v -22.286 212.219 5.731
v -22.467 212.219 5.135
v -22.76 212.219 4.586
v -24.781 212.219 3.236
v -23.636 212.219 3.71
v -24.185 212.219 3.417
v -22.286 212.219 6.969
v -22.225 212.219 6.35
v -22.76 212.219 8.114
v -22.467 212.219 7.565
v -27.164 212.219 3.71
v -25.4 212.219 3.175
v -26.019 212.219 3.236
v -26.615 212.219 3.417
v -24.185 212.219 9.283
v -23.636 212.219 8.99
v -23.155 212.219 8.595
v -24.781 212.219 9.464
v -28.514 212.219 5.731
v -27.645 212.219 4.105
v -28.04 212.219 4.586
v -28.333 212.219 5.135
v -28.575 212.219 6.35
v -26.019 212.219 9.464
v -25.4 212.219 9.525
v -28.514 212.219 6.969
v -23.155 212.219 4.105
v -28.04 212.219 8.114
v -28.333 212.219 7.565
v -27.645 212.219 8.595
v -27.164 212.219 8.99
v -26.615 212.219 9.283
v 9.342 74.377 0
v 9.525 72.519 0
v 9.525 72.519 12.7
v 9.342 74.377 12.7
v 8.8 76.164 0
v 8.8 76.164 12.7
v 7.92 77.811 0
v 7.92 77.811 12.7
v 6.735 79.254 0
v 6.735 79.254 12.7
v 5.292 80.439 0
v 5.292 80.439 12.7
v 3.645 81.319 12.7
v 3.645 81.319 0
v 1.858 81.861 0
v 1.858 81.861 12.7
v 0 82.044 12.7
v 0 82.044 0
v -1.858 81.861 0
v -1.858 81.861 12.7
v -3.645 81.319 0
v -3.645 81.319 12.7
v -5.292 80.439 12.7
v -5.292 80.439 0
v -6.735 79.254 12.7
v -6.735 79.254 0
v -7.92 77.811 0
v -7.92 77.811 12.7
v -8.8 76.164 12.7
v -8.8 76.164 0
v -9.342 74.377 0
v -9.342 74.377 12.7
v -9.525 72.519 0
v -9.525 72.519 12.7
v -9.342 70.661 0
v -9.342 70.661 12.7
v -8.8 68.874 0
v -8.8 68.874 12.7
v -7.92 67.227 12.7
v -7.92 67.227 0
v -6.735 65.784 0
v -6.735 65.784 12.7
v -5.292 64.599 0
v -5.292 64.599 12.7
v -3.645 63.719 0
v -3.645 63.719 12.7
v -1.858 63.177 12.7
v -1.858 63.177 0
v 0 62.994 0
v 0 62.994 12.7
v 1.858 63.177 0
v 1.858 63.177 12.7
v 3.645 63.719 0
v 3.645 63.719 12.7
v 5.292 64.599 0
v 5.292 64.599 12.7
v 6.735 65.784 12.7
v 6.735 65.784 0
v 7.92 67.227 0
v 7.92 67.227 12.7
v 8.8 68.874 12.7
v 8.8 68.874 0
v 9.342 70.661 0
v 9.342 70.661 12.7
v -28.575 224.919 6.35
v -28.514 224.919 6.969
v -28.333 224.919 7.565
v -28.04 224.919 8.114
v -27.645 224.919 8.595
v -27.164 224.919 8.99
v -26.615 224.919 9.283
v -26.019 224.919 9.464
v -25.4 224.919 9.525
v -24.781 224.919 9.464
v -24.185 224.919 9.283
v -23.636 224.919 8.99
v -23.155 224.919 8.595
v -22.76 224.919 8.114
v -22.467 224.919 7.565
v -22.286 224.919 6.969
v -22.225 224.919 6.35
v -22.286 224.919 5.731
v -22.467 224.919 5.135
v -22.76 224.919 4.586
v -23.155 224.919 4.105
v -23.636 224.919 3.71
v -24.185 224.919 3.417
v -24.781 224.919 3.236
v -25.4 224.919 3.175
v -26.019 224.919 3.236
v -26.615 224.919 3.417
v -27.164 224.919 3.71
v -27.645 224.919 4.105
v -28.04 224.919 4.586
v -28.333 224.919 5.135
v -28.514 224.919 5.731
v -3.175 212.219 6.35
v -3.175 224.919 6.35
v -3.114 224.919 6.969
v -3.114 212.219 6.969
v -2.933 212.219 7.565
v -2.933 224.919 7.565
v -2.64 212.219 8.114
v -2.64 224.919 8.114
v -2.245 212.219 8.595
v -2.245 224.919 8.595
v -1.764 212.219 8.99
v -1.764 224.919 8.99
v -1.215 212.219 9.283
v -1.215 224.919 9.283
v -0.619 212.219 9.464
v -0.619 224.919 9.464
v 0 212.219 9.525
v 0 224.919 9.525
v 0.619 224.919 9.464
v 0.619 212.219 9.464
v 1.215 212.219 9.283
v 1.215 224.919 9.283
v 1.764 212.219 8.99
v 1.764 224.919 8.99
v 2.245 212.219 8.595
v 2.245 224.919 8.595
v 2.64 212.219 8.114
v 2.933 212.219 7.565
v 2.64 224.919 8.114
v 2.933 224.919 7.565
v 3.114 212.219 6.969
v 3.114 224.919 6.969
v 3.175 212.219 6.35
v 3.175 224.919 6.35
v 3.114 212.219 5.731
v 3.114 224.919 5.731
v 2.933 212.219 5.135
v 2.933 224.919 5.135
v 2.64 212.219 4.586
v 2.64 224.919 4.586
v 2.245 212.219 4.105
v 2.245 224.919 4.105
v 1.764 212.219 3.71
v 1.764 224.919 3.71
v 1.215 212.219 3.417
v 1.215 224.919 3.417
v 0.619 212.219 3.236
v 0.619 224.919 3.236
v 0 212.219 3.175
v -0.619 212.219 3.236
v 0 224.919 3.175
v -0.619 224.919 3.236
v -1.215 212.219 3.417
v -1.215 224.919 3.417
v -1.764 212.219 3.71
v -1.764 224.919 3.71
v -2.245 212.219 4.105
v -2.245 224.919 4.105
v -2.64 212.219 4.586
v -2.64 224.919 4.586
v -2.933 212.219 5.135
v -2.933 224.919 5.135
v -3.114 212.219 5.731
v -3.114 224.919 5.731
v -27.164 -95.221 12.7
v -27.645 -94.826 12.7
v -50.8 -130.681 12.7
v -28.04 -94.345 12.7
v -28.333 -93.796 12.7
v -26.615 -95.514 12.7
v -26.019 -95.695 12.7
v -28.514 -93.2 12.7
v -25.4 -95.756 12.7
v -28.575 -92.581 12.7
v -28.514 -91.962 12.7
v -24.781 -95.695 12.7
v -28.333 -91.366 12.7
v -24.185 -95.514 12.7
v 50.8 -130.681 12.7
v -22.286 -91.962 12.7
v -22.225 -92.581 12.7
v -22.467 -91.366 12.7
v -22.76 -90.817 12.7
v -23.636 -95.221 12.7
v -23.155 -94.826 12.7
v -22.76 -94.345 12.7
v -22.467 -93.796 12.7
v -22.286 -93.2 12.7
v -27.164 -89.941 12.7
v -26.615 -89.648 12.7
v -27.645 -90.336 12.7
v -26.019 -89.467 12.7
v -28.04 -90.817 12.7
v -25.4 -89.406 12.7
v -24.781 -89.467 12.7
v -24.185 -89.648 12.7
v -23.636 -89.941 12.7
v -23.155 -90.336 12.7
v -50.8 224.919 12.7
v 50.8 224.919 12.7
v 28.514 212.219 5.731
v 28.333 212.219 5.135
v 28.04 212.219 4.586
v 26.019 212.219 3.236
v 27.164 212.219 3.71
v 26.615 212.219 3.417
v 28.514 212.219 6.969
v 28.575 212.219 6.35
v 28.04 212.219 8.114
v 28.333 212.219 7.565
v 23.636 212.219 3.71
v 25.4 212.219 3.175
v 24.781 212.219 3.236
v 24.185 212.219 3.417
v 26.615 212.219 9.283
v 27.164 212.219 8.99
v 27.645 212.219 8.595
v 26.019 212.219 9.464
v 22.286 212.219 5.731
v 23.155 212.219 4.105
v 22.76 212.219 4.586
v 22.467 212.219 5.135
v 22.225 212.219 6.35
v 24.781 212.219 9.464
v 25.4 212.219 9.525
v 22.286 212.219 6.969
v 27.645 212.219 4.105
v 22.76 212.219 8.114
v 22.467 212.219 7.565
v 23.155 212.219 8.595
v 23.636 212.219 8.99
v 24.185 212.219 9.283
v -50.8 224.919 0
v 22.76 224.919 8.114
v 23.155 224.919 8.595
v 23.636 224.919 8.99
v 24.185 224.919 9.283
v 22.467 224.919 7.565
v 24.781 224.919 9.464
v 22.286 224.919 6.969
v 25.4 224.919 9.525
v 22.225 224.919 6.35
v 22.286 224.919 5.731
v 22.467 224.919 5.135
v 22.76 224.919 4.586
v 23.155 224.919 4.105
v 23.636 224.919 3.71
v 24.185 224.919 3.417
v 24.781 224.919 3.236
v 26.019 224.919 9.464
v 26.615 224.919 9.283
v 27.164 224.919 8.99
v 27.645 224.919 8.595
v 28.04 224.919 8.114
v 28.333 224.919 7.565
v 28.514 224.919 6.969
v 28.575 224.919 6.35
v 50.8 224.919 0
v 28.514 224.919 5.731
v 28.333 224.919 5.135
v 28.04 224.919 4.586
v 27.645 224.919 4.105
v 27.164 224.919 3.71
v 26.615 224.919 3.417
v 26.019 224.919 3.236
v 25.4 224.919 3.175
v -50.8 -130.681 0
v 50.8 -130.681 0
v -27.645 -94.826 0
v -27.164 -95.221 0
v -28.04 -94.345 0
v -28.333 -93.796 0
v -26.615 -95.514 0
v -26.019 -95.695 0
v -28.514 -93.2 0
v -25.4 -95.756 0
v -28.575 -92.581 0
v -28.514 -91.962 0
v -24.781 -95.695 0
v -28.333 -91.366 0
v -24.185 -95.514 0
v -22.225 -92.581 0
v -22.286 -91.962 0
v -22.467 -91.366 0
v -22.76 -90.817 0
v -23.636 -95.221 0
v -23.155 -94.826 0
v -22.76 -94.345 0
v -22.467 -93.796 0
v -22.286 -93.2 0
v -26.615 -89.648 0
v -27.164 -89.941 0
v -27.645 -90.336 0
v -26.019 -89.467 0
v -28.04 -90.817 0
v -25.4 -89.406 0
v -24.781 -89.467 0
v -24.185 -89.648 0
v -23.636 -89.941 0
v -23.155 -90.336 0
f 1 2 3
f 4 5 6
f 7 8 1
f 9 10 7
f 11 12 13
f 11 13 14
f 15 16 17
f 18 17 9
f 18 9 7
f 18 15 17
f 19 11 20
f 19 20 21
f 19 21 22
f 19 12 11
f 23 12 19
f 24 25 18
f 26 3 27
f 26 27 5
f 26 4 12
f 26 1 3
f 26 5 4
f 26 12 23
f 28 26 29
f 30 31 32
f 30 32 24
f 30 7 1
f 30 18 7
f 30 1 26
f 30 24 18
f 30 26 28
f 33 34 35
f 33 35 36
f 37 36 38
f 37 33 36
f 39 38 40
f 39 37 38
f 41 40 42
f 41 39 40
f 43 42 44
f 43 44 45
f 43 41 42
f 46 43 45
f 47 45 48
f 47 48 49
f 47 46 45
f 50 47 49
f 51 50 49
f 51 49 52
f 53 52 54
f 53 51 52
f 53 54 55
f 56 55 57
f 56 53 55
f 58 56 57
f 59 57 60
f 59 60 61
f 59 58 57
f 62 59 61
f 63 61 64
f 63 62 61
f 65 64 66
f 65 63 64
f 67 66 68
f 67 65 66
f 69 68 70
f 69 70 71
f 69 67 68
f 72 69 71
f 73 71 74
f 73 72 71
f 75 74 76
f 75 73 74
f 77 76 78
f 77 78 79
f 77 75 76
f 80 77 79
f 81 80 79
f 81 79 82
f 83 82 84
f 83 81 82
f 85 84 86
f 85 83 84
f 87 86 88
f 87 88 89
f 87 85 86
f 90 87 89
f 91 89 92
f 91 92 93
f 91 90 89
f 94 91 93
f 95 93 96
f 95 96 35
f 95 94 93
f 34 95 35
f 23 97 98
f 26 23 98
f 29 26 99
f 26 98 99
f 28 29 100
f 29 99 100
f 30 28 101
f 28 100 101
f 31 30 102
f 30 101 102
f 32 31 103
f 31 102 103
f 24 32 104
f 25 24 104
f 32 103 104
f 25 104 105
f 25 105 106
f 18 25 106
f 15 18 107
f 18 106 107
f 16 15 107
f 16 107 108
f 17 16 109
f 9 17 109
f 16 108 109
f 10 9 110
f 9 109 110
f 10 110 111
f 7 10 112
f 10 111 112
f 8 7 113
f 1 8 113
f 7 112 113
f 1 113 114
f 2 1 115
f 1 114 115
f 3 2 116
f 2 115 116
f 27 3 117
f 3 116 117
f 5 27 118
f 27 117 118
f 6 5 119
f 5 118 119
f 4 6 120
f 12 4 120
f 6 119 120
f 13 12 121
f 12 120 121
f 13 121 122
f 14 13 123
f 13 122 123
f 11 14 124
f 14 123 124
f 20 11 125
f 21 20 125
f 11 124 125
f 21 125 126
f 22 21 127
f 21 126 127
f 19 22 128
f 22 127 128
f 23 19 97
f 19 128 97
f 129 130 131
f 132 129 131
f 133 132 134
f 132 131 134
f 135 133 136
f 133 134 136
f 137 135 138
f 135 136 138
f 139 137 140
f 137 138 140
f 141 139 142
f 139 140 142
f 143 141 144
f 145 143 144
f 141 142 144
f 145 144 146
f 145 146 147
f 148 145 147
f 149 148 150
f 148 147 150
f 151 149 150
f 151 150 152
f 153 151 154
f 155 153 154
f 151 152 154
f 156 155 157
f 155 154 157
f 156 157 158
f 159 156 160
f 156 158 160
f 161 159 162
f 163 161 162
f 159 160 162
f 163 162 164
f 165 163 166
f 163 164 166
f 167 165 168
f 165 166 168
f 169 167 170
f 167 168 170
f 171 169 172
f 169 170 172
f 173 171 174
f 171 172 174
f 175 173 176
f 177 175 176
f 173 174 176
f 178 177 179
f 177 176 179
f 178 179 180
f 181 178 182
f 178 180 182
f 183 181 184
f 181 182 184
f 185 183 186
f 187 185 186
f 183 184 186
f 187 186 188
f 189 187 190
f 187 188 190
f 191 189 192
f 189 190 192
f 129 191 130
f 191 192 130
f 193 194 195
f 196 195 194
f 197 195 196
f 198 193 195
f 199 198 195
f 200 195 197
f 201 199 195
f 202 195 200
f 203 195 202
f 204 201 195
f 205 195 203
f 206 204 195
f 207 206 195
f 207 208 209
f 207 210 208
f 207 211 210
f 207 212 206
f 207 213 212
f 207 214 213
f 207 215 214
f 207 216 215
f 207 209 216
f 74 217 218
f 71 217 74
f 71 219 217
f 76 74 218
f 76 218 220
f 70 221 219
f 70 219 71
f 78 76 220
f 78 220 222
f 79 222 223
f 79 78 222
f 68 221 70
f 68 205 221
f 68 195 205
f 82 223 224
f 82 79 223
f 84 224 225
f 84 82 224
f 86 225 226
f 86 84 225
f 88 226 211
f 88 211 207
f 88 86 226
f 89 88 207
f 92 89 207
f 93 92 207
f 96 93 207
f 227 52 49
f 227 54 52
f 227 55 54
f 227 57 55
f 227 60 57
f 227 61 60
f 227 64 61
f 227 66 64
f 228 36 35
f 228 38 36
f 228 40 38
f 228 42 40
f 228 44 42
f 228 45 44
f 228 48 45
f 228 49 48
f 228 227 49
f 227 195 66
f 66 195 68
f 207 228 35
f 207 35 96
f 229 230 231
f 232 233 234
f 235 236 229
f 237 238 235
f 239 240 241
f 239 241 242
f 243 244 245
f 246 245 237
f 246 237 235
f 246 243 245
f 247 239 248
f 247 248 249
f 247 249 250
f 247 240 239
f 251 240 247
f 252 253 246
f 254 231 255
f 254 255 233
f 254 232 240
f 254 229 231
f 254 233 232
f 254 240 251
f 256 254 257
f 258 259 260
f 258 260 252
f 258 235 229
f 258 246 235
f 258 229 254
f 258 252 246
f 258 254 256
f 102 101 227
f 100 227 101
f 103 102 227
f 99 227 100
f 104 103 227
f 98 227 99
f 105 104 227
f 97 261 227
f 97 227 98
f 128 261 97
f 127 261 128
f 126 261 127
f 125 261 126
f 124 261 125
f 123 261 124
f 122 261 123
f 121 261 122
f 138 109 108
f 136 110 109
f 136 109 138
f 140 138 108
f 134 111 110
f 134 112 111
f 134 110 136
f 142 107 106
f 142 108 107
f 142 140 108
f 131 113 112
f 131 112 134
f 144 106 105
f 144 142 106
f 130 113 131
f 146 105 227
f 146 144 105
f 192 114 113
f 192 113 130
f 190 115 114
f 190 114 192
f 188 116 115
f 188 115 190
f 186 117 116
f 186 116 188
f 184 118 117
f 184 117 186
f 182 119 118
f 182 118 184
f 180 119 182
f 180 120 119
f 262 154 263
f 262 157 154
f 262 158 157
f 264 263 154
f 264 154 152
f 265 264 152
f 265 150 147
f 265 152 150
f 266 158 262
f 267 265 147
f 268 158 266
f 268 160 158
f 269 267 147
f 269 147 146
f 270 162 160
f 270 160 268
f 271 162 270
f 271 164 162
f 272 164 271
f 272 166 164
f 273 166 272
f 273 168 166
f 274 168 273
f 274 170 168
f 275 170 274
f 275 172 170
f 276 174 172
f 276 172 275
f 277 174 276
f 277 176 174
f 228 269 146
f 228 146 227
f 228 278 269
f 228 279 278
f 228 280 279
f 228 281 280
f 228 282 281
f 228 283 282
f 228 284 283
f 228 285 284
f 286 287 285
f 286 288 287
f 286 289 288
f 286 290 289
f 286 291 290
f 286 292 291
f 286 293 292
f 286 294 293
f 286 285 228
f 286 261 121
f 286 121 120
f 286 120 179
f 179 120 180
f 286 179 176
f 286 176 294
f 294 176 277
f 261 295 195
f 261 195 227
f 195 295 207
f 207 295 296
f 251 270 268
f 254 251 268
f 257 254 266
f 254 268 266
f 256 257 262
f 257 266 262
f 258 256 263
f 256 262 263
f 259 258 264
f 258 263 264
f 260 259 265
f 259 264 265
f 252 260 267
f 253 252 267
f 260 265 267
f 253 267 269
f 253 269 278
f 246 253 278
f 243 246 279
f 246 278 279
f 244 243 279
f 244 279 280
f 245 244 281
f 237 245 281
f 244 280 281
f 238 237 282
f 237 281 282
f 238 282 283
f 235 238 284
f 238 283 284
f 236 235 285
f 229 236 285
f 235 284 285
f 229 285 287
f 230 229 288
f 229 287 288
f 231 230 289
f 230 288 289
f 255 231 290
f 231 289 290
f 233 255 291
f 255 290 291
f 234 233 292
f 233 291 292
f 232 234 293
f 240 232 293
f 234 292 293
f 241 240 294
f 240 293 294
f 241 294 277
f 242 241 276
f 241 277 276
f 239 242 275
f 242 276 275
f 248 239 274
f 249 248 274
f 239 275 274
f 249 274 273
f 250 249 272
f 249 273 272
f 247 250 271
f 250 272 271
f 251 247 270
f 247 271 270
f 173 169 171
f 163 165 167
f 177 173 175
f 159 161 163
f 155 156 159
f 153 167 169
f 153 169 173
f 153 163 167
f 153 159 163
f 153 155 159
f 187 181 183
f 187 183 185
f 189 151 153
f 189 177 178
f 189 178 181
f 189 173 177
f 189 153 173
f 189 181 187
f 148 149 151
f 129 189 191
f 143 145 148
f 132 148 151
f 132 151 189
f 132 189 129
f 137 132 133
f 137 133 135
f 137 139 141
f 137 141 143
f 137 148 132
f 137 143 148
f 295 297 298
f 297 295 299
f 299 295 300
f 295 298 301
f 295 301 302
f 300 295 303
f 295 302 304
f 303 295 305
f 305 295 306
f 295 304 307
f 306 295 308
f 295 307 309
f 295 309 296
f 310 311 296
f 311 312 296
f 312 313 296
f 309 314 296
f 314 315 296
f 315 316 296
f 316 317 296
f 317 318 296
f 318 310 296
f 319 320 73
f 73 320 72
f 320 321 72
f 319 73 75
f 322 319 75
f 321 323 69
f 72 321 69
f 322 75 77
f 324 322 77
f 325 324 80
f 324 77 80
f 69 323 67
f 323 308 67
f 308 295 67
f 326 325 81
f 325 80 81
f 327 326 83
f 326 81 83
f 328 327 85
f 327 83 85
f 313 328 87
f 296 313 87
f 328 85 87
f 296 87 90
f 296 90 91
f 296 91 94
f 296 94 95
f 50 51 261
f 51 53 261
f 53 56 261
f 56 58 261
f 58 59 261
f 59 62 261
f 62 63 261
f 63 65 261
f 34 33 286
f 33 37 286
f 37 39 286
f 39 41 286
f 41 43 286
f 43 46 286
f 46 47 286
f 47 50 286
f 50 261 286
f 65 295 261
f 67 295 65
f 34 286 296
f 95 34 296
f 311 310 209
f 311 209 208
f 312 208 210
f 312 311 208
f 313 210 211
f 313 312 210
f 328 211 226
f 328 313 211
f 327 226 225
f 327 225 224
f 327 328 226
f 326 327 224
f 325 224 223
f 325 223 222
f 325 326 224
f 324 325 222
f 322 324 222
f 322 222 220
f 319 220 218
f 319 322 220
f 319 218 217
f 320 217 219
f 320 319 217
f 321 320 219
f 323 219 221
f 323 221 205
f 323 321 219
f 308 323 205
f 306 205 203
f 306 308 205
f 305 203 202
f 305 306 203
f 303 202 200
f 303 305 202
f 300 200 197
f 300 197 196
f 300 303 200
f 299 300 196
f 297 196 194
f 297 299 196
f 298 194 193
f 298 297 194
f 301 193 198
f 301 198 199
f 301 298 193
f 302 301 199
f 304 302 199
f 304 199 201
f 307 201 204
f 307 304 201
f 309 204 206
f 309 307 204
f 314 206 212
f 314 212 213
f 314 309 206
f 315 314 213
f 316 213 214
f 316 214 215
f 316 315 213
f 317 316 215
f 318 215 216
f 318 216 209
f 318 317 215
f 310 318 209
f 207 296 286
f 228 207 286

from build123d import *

# Parameters (mm, degrees)
F0_W     = 101.6
F0_H     = 355.6
F0_R     = 3.175
F0_R_2   = 9.525
F1_DEPTH = 12.7
F2_R     = 3.175
F3_DEPTH = 12.7


with BuildPart() as f1:
    # F0 (on Top) → F1 (new body)
    with BuildSketch(Plane.XY):
        with Locations((0, 47.119086)):
            Rectangle(F0_W, F0_H)
        with Locations((-25.4, -92.580914)):
            Circle(F0_R, mode=Mode.SUBTRACT)
        with Locations((0, 72.519086)):
            Circle(F0_R_2, mode=Mode.SUBTRACT)
    extrude(amount=F1_DEPTH)

    # F2 (on face) → F3 (cut)
    with BuildSketch(Plane(origin=(0, 224.919086, 0), x_dir=(-1, 0, 0), z_dir=(0, 1, 0))):
        with Locations((-25.4, 6.35)):
            Circle(F2_R)
        with Locations((0, 6.35)):
            Circle(F2_R)
        with Locations((25.4, 6.35)):
            Circle(F2_R)
    extrude(amount=-F3_DEPTH, mode=Mode.SUBTRACT)


solid = f1.part
